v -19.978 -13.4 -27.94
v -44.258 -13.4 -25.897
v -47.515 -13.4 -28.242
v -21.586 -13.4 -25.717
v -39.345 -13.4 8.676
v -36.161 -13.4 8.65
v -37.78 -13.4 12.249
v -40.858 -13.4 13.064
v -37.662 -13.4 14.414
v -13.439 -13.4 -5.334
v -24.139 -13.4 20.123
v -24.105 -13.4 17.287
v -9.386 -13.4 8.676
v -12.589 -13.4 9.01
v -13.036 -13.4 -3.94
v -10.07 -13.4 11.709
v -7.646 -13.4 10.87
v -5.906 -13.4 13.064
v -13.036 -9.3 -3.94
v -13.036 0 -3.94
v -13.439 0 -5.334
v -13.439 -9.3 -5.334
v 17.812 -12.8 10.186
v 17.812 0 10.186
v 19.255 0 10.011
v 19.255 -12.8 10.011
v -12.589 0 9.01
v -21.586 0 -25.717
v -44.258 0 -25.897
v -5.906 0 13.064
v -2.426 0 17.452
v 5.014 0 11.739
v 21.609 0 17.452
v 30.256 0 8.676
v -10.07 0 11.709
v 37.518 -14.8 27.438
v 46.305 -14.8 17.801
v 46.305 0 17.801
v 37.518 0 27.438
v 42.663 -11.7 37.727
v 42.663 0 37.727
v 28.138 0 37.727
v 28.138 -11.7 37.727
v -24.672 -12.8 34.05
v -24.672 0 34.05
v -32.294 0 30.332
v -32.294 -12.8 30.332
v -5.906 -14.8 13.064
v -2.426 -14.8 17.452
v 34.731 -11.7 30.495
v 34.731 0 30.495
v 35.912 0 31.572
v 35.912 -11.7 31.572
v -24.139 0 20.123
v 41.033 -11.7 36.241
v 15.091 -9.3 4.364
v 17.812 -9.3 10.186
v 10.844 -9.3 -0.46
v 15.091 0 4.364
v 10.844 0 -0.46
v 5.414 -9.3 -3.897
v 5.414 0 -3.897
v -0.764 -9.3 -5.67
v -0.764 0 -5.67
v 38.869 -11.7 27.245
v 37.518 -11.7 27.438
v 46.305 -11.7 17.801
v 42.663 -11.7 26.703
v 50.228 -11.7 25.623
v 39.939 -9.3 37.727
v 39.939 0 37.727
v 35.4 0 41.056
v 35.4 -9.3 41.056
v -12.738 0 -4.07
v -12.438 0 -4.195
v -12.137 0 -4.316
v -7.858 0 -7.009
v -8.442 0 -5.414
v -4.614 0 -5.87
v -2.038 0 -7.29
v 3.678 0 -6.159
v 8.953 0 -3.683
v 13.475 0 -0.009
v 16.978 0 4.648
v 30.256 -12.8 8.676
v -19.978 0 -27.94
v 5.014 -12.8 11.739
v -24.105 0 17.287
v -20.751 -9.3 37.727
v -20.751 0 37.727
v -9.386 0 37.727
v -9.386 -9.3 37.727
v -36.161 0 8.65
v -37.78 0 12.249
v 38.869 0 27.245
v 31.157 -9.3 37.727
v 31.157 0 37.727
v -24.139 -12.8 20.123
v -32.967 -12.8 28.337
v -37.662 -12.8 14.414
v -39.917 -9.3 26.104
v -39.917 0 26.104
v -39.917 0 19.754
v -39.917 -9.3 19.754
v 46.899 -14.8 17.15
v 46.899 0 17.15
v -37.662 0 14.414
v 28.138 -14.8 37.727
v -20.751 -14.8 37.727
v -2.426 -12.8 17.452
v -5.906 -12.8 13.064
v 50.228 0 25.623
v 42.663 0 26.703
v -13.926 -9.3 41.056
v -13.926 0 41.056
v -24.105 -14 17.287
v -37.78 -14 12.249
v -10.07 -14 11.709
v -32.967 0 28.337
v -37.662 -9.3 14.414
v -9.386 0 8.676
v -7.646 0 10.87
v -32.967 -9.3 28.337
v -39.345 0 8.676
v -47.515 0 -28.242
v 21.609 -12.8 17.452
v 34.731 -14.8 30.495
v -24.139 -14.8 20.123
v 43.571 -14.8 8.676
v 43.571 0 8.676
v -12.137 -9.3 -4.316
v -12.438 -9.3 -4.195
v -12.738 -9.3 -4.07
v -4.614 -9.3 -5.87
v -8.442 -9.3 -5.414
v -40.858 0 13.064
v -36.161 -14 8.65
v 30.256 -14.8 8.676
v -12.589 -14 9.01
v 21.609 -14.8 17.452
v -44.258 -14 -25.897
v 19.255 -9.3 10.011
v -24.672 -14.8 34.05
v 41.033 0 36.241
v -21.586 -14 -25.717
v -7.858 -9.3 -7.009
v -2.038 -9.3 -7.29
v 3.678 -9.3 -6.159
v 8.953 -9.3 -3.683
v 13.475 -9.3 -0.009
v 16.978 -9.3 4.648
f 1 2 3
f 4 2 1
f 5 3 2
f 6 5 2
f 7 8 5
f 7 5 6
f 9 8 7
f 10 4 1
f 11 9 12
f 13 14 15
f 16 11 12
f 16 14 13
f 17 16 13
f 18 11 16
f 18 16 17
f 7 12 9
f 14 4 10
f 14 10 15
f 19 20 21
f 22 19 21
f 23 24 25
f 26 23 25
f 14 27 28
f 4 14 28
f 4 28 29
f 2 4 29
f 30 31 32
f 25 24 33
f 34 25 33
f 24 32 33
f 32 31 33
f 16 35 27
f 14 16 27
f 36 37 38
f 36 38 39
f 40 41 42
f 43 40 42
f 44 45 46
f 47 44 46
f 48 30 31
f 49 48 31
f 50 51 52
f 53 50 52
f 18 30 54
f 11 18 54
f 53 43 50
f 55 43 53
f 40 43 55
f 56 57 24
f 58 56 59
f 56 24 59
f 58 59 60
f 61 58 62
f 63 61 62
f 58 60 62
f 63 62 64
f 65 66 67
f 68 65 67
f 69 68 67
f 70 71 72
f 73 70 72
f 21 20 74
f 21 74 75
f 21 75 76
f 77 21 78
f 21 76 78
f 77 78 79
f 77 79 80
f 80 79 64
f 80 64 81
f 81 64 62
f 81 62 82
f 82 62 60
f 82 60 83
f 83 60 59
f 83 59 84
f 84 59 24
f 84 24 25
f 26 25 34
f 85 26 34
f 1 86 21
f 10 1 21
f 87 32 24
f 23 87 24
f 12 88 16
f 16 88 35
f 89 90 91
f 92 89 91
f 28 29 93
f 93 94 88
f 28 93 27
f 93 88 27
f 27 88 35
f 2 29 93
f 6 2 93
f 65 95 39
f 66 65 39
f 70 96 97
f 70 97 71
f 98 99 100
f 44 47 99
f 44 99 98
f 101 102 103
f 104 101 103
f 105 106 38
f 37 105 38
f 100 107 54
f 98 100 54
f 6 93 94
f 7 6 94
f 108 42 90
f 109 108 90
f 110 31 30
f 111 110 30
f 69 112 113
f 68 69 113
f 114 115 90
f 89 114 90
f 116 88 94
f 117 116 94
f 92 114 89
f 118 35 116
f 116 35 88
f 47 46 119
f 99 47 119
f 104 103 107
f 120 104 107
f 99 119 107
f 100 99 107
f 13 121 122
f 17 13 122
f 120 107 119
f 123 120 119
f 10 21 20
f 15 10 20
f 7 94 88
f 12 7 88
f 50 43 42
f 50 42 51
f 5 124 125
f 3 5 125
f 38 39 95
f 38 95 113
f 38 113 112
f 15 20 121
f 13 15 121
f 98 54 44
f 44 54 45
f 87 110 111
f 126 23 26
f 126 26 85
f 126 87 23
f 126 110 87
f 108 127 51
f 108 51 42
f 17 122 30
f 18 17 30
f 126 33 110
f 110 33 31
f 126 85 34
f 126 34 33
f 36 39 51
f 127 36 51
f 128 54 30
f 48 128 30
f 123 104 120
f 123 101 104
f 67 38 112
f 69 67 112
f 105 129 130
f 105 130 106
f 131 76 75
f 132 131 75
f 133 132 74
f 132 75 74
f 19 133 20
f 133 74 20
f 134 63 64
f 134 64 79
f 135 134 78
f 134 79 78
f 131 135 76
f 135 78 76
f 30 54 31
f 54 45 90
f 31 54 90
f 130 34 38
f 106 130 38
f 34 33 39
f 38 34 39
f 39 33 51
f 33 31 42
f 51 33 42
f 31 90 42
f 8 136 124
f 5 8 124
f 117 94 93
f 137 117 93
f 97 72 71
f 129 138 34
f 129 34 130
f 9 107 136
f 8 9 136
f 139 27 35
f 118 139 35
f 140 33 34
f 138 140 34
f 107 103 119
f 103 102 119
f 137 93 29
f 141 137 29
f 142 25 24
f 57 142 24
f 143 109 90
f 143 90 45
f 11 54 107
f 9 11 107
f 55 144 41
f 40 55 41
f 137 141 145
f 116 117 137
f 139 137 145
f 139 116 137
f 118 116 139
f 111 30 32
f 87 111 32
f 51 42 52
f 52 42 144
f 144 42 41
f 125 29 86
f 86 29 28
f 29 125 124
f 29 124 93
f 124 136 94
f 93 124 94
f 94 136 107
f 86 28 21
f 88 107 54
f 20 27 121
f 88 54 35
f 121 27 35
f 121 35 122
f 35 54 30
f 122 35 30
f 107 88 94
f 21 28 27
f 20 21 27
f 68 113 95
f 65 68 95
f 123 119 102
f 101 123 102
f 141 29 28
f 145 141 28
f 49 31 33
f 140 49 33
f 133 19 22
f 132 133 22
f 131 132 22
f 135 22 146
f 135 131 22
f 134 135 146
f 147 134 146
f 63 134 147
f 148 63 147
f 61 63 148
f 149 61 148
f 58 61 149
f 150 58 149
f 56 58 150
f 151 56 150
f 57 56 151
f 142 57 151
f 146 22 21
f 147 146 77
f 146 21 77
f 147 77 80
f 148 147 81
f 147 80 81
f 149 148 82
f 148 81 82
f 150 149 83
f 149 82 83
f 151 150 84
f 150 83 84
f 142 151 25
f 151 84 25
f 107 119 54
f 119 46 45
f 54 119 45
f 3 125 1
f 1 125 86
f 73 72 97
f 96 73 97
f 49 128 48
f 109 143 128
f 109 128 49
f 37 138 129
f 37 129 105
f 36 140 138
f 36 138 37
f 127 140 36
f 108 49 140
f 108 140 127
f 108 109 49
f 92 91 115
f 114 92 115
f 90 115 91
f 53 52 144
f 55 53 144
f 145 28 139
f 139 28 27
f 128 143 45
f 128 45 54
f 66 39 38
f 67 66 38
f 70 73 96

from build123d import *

# Parameters (mm, degrees)
F1_DEPTH = 14.8
F2_DEPTH = 12.8
F3_DEPTH = 14
F4_DEPTH = 13.4
F5_DEPTH = 9.3
F6_DEPTH = 11.7


with BuildPart() as f1:
    # F0 (on Front) → F1 (new body)
    with BuildSketch(Plane.XZ):
        Polygon((21.609111, 17.452165), (30.2558, 8.676423), (43.570716, 8.676423), (46.899447, 17.149554), (46.305027, 17.801499), (37.518481, 27.438356), (34.731223, 30.495349), (28.137514, 37.727159), (-9.386347, 37.727159), (-20.750649, 37.727159), (-24.672133, 34.049701), (-24.138673, 20.123417), (-5.906312, 13.064294), (-2.426276, 17.452165), align=None)
    extrude(amount=F1_DEPTH)


with BuildPart() as f2:
    # F0 (on Front) → F2 (new body)
    with BuildSketch(Plane.XZ):
        Polygon((-32.967201, 28.33666), (-37.661809, 14.413761), (-24.138673, 20.123417), (-24.672133, 34.049701), (-32.294322, 30.332234), align=None)
        Polygon((17.811619, 10.186386), (19.254982, 10.01125), (30.2558, 8.676423), (21.609111, 17.452165), (-2.426276, 17.452165), (-5.906312, 13.064294), (5.013908, 11.739247), align=None)
    extrude(amount=F2_DEPTH)


with BuildPart() as f3:
    # F0 (on Front) → F3 (new body)
    with BuildSketch(Plane.XZ):
        Polygon((-10.070257, 11.708856), (-24.105113, 17.286811), (-37.780102, 12.248658), (-36.160696, 8.649977), (-44.257727, -25.897361), (-21.586036, -25.71743), (-12.589334, 9.009845), align=None)
    extrude(amount=F3_DEPTH)


with BuildPart() as f4:
    # F0 (on Front) → F4 (new body)
    with BuildSketch(Plane.XZ):
        Polygon((-47.515433, -28.242217), (-19.97776, -27.939606), (-13.438908, -5.333863), (-13.035865, -3.940483), (-9.386347, 8.676423), (-7.646329, 10.870358), (-5.906312, 13.064294), (-24.138673, 20.123417), (-37.661809, 14.413761), (-40.857976, 13.064294), (-39.344918, 8.676423), align=None)
        Polygon((-37.780102, 12.248658), (-24.105113, 17.286811), (-10.070257, 11.708856), (-12.589334, 9.009845), (-21.586036, -25.71743), (-44.257727, -25.897361), (-36.160696, 8.649977), align=None, mode=Mode.SUBTRACT)
    extrude(amount=F4_DEPTH)


with BuildPart() as f5:
    # F0 (on Front) → F5 (new body)
    with BuildSketch(Plane.XZ):
        Polygon((-39.916511, 19.753949), (-37.661809, 14.413761), (-32.967201, 28.33666), (-39.916511, 26.10358), align=None)
        Polygon((-13.925524, 41.055884), (-20.750649, 37.727159), (-9.386347, 37.727159), align=None)
        Polygon((35.4002, 41.055884), (31.156536, 37.727159), (39.939377, 37.727159), align=None)
        with BuildLine():
            Line((-13.035865, -3.940483), (-13.438908, -5.333863))
            ThreePointArc((-13.438908, -5.333863), (6.390889, -5.081779), (19.254982, 10.01125))
            Line((19.254982, 10.01125), (17.811619, 10.186386))
            ThreePointArc((17.811619, 10.186386), (10.844493, -0.460302), (-0.763695, -5.670176))
            ThreePointArc((-0.763695, -5.670176), (-6.537311, -5.723916), (-12.136886, -4.315975))
            ThreePointArc((-12.136886, -4.315975), (-12.588395, -4.133064), (-13.035865, -3.940483))
        make_face()
    extrude(amount=F5_DEPTH)


with BuildPart() as f6:
    # F0 (on Front) → F6 (new body)
    with BuildSketch(Plane.XZ):
        Polygon((28.137514, 37.727159), (34.731223, 30.495349), (35.911573, 31.571551), (41.032836, 36.240938), (42.662885, 37.727159), (39.939377, 37.727159), (31.156536, 37.727159), align=None)
        Polygon((37.518481, 27.438356), (46.305027, 17.801499), (50.228179, 25.622685), (42.662885, 26.703441), (38.869104, 27.24541), align=None)
    extrude(amount=F6_DEPTH)


solid = Compound([f1.part, f2.part, f3.part, f4.part, f5.part, f6.part])
